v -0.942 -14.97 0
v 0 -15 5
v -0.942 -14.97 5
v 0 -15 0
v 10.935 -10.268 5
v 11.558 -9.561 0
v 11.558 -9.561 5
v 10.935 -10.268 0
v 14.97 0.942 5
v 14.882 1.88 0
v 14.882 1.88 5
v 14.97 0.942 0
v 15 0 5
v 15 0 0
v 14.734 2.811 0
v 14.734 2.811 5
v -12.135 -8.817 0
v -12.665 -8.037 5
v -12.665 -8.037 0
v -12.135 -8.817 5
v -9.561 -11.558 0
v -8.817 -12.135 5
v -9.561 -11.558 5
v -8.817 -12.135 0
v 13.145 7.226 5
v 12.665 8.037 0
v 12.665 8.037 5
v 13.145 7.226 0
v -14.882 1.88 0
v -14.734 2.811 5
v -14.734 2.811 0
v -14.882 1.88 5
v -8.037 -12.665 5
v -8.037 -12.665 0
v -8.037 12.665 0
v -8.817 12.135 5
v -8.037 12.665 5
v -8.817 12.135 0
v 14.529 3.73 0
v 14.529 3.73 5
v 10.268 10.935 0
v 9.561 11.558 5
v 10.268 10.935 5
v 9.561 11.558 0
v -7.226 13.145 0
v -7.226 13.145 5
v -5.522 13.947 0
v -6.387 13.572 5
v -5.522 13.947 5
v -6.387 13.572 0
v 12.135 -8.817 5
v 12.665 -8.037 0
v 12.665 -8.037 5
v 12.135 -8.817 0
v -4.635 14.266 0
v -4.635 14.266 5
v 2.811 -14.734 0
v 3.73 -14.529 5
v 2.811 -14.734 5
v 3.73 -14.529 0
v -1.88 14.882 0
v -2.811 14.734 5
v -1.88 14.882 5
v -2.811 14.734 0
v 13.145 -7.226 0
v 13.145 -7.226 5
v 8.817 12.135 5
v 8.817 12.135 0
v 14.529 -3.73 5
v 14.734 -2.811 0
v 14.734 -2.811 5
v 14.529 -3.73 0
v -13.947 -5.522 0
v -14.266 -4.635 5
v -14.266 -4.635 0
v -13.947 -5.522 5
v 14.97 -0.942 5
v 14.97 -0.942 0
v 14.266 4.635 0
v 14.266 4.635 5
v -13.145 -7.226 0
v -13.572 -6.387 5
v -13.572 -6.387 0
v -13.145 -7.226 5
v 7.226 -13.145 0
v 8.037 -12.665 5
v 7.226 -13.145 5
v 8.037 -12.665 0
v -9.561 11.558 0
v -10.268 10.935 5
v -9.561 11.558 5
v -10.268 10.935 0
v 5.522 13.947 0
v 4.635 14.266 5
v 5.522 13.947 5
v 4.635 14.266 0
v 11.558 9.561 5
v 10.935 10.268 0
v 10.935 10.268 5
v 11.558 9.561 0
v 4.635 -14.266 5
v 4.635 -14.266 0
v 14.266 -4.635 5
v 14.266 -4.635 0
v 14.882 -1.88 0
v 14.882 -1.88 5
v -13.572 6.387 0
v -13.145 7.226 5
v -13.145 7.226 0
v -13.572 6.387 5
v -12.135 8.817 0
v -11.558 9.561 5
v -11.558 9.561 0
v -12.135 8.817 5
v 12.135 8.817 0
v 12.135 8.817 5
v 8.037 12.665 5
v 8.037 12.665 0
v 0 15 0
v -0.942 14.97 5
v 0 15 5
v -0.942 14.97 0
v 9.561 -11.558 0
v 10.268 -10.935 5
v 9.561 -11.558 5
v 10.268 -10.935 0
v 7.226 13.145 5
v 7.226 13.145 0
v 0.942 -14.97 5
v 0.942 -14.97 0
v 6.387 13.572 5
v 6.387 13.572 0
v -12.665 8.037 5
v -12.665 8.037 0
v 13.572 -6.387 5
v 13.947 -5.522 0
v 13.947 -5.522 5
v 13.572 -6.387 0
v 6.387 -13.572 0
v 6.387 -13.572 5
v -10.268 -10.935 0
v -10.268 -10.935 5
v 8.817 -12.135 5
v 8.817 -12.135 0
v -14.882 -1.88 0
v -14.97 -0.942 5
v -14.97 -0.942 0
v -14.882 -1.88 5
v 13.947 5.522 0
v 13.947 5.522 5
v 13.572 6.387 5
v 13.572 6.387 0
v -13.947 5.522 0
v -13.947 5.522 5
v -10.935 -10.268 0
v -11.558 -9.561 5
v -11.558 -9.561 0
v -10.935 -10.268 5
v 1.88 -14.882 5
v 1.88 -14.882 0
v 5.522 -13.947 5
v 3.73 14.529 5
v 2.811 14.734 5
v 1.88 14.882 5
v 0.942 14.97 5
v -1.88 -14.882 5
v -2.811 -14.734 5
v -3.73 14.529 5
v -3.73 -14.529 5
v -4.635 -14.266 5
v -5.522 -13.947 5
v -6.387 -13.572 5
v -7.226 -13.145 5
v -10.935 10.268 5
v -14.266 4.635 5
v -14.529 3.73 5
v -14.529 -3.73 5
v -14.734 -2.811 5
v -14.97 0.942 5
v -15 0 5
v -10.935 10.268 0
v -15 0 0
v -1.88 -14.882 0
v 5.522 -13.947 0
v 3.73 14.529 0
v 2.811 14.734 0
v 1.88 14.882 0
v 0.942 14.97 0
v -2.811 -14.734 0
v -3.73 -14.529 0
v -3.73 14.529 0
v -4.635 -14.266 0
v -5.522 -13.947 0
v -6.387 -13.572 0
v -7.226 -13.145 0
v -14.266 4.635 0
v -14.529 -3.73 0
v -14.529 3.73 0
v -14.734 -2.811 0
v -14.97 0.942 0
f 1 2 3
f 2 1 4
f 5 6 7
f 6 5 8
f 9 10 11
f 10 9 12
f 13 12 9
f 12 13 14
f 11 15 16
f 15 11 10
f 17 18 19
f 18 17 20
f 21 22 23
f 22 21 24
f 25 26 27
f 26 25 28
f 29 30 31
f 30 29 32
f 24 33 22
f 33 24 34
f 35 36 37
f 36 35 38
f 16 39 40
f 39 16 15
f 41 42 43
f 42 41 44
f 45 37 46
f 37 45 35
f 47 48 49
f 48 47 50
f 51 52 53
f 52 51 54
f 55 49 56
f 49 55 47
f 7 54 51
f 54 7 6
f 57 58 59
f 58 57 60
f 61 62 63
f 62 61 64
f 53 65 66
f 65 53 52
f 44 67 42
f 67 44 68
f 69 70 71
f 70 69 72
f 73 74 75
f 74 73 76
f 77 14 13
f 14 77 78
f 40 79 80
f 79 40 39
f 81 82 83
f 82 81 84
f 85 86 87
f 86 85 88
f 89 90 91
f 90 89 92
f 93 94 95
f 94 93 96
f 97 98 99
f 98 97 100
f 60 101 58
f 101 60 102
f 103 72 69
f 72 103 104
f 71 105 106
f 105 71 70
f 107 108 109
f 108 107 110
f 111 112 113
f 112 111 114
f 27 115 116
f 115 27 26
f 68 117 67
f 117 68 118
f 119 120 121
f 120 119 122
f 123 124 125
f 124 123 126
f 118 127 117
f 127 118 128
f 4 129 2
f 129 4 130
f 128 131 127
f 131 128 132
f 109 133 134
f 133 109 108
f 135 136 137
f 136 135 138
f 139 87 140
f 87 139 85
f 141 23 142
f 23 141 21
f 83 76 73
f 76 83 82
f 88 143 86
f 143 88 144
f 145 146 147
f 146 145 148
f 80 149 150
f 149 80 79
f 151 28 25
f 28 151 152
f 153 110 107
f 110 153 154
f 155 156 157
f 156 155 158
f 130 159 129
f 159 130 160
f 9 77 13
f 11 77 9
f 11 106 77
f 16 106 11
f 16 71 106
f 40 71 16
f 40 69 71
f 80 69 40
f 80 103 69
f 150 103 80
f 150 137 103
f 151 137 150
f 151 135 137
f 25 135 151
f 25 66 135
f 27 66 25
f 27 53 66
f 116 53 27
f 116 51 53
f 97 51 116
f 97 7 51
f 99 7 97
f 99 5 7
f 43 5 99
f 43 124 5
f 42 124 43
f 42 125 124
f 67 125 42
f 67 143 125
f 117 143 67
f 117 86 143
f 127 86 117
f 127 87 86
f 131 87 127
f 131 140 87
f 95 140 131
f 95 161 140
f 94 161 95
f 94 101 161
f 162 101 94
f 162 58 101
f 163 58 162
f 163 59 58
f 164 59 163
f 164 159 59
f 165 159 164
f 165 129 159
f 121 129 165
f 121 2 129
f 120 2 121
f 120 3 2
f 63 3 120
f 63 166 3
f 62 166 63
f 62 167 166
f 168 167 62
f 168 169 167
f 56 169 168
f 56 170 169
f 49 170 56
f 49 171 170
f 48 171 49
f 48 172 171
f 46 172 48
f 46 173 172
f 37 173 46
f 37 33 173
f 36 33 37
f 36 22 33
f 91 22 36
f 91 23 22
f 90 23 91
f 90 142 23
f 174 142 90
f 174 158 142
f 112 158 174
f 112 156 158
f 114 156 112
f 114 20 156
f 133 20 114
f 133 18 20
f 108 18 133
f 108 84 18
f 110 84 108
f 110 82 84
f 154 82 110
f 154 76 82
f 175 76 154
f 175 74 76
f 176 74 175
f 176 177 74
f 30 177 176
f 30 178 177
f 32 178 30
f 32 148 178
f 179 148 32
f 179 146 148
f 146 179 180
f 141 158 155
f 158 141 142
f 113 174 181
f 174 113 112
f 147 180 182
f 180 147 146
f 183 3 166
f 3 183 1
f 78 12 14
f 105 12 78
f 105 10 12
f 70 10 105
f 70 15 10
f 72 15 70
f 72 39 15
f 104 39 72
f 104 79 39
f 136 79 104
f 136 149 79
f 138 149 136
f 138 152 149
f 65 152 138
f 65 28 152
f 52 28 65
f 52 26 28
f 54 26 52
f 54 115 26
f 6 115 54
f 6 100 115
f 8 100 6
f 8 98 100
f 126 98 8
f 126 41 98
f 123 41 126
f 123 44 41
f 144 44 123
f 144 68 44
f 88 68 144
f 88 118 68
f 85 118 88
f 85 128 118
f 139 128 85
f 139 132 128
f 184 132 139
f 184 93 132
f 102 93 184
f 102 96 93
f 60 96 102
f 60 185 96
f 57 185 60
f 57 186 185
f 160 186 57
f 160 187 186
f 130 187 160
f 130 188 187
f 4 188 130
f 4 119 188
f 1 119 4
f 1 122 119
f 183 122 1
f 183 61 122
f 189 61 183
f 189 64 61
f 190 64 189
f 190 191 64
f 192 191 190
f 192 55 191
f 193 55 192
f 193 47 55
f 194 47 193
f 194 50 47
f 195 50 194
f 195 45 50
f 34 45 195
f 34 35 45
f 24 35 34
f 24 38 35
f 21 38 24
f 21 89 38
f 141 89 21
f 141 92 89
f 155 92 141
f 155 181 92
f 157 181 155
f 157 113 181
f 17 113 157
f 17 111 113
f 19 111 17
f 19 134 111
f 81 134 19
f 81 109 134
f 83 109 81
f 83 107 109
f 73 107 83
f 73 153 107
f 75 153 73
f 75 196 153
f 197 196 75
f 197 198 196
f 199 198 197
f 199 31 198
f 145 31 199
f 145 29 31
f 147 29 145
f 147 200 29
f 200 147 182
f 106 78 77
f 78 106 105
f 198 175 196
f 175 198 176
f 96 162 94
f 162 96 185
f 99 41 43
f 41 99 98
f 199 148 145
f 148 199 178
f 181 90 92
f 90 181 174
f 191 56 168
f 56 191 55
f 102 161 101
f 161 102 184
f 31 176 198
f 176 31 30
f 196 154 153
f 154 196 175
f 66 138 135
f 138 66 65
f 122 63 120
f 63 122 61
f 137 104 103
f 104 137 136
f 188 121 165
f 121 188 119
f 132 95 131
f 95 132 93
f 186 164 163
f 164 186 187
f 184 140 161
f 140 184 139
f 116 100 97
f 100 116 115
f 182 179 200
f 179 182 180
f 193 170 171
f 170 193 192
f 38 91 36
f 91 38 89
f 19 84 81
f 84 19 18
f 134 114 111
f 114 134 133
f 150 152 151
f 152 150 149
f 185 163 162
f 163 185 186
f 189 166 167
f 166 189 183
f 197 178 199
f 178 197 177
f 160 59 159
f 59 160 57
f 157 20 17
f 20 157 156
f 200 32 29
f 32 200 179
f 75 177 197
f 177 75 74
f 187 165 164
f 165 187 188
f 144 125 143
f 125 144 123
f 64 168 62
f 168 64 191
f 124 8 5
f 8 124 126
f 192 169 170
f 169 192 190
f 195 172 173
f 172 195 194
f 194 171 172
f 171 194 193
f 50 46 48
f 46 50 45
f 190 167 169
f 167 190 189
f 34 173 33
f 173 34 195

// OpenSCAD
garminOuterHeight = 3;

// 아랫면을 3mm 쉘로 파내기
difference() {
    cylinder(h = 5, d = 30, $fn = 100);
    translate([0, 0, 0]);
    cylinder(h = 5, d = 30 - 2 * 3, $fn = 100);
}

    cylinder(h = 5, d = 30, $fn = 100);
